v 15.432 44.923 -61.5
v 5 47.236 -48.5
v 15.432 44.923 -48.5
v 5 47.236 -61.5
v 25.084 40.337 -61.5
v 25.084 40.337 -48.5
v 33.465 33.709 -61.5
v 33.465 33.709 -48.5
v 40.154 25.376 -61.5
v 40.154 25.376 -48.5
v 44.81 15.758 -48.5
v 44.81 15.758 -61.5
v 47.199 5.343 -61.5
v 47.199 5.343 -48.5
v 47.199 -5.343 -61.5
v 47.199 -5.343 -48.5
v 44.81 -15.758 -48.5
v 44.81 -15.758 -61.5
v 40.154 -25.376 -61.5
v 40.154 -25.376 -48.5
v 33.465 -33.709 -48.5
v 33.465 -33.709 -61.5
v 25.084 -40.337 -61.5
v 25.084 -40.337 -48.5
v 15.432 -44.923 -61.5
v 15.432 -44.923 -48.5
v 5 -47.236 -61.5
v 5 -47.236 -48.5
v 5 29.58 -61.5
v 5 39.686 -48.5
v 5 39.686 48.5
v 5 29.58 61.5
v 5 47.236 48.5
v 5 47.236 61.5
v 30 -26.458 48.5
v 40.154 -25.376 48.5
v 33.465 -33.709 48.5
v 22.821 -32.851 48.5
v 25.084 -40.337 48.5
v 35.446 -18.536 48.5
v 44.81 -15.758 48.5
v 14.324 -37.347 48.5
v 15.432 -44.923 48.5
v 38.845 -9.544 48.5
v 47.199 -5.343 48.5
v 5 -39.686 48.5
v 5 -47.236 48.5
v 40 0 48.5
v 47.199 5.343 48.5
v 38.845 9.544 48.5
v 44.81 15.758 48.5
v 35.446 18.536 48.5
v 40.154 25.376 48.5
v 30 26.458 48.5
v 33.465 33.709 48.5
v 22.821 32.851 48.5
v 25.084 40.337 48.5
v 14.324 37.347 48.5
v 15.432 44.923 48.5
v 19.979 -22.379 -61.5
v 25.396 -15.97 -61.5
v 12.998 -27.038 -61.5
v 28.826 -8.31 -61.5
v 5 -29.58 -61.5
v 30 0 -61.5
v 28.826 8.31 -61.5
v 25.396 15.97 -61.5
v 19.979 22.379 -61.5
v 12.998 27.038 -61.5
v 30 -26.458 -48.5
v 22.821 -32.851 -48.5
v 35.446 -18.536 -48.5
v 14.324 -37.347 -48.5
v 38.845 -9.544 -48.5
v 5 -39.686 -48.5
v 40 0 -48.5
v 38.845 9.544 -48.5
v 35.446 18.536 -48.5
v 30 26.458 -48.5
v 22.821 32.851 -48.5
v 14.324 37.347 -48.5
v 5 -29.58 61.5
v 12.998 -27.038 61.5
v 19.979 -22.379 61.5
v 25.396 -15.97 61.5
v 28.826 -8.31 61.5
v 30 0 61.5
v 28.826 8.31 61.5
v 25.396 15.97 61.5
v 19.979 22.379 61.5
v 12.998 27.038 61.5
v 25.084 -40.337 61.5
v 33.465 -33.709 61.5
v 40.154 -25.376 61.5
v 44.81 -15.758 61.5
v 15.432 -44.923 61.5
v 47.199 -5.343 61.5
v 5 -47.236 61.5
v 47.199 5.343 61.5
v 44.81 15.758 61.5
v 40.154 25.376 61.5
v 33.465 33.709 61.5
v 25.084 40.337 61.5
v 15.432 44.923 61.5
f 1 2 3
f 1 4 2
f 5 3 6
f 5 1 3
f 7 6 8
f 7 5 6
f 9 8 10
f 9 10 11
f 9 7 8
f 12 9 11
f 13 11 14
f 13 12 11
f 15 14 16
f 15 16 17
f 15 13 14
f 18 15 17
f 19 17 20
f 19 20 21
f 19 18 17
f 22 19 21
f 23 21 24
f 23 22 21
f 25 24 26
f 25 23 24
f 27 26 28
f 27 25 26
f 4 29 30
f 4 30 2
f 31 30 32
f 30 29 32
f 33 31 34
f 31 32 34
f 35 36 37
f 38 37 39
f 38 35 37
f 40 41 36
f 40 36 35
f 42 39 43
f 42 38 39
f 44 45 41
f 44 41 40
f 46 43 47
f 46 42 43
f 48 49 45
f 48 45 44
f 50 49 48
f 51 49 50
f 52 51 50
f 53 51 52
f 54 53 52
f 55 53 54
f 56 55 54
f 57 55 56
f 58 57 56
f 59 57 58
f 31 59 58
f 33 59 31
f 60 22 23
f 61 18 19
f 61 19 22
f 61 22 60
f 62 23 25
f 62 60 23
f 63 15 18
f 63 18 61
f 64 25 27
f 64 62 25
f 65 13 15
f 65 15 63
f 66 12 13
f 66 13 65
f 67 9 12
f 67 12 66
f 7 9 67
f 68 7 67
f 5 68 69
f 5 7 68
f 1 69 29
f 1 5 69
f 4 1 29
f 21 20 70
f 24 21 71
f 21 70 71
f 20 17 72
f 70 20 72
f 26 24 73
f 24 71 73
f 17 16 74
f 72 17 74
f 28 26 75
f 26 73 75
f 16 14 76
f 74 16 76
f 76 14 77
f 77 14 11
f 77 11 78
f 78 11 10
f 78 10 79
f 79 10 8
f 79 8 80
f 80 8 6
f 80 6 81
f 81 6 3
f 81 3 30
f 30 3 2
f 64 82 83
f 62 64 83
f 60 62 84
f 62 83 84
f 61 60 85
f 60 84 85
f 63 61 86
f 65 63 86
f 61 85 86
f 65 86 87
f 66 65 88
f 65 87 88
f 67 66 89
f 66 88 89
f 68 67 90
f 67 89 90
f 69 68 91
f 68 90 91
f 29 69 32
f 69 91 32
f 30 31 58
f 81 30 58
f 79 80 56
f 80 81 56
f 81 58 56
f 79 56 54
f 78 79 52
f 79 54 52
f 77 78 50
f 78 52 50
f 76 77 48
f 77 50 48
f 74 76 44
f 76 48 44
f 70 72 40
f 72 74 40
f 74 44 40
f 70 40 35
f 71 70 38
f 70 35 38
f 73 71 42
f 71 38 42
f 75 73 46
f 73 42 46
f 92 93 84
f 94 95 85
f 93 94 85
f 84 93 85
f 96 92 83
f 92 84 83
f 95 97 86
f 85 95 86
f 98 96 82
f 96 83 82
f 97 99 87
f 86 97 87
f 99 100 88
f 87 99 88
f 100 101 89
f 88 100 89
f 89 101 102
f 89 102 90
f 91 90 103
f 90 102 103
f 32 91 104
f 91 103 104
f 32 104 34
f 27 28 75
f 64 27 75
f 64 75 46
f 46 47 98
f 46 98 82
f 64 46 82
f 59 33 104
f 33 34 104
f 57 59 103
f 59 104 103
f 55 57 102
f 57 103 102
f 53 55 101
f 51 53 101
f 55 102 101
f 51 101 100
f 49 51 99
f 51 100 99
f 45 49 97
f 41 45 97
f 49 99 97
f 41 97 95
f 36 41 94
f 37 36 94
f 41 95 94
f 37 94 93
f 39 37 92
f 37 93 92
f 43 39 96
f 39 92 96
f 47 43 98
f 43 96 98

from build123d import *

# Parameters (mm, degrees)
BOSS_EXTRUDE1_DEPTH = 55
BOSS_EXTRUDE2_DEPTH = 6.5


with BuildPart() as part:
    # Sketch1 → Boss-Extrude1 (new, symmetric)
    with BuildSketch(Plane.XY):
        with BuildLine():
            Line((5, 29.580398915), (5, 39.686269666))
            ThreePointArc((5, 39.686269666), (40, 0), (5, -39.686269666))
            Line((5, -39.686269666), (5, -29.580398915))
            ThreePointArc((5, -29.580398915), (30, 0), (5, 29.580398915))
        make_face()
    extrude(amount=BOSS_EXTRUDE1_DEPTH, both=True)

    # Sketch2 → Boss-Extrude2 (add, symmetric)
    with BuildSketch(Plane.XY.offset(55)):
        with BuildLine():
            Line((5, 29.580398915), (5, 47.236109069))
            ThreePointArc((5, 47.236109069), (47.5, 0), (5, -47.236109069))
            Line((5, -47.236109069), (5, -29.580398915))
            ThreePointArc((5, -29.580398915), (30, 0), (5, 29.580398915))
        make_face()
    boss_extrude2 = extrude(amount=BOSS_EXTRUDE2_DEPTH, both=True)

    # Mirror2: Boss-Extrude2 across plane
    add(boss_extrude2.mirror(Plane.XY))


solid = part.part
